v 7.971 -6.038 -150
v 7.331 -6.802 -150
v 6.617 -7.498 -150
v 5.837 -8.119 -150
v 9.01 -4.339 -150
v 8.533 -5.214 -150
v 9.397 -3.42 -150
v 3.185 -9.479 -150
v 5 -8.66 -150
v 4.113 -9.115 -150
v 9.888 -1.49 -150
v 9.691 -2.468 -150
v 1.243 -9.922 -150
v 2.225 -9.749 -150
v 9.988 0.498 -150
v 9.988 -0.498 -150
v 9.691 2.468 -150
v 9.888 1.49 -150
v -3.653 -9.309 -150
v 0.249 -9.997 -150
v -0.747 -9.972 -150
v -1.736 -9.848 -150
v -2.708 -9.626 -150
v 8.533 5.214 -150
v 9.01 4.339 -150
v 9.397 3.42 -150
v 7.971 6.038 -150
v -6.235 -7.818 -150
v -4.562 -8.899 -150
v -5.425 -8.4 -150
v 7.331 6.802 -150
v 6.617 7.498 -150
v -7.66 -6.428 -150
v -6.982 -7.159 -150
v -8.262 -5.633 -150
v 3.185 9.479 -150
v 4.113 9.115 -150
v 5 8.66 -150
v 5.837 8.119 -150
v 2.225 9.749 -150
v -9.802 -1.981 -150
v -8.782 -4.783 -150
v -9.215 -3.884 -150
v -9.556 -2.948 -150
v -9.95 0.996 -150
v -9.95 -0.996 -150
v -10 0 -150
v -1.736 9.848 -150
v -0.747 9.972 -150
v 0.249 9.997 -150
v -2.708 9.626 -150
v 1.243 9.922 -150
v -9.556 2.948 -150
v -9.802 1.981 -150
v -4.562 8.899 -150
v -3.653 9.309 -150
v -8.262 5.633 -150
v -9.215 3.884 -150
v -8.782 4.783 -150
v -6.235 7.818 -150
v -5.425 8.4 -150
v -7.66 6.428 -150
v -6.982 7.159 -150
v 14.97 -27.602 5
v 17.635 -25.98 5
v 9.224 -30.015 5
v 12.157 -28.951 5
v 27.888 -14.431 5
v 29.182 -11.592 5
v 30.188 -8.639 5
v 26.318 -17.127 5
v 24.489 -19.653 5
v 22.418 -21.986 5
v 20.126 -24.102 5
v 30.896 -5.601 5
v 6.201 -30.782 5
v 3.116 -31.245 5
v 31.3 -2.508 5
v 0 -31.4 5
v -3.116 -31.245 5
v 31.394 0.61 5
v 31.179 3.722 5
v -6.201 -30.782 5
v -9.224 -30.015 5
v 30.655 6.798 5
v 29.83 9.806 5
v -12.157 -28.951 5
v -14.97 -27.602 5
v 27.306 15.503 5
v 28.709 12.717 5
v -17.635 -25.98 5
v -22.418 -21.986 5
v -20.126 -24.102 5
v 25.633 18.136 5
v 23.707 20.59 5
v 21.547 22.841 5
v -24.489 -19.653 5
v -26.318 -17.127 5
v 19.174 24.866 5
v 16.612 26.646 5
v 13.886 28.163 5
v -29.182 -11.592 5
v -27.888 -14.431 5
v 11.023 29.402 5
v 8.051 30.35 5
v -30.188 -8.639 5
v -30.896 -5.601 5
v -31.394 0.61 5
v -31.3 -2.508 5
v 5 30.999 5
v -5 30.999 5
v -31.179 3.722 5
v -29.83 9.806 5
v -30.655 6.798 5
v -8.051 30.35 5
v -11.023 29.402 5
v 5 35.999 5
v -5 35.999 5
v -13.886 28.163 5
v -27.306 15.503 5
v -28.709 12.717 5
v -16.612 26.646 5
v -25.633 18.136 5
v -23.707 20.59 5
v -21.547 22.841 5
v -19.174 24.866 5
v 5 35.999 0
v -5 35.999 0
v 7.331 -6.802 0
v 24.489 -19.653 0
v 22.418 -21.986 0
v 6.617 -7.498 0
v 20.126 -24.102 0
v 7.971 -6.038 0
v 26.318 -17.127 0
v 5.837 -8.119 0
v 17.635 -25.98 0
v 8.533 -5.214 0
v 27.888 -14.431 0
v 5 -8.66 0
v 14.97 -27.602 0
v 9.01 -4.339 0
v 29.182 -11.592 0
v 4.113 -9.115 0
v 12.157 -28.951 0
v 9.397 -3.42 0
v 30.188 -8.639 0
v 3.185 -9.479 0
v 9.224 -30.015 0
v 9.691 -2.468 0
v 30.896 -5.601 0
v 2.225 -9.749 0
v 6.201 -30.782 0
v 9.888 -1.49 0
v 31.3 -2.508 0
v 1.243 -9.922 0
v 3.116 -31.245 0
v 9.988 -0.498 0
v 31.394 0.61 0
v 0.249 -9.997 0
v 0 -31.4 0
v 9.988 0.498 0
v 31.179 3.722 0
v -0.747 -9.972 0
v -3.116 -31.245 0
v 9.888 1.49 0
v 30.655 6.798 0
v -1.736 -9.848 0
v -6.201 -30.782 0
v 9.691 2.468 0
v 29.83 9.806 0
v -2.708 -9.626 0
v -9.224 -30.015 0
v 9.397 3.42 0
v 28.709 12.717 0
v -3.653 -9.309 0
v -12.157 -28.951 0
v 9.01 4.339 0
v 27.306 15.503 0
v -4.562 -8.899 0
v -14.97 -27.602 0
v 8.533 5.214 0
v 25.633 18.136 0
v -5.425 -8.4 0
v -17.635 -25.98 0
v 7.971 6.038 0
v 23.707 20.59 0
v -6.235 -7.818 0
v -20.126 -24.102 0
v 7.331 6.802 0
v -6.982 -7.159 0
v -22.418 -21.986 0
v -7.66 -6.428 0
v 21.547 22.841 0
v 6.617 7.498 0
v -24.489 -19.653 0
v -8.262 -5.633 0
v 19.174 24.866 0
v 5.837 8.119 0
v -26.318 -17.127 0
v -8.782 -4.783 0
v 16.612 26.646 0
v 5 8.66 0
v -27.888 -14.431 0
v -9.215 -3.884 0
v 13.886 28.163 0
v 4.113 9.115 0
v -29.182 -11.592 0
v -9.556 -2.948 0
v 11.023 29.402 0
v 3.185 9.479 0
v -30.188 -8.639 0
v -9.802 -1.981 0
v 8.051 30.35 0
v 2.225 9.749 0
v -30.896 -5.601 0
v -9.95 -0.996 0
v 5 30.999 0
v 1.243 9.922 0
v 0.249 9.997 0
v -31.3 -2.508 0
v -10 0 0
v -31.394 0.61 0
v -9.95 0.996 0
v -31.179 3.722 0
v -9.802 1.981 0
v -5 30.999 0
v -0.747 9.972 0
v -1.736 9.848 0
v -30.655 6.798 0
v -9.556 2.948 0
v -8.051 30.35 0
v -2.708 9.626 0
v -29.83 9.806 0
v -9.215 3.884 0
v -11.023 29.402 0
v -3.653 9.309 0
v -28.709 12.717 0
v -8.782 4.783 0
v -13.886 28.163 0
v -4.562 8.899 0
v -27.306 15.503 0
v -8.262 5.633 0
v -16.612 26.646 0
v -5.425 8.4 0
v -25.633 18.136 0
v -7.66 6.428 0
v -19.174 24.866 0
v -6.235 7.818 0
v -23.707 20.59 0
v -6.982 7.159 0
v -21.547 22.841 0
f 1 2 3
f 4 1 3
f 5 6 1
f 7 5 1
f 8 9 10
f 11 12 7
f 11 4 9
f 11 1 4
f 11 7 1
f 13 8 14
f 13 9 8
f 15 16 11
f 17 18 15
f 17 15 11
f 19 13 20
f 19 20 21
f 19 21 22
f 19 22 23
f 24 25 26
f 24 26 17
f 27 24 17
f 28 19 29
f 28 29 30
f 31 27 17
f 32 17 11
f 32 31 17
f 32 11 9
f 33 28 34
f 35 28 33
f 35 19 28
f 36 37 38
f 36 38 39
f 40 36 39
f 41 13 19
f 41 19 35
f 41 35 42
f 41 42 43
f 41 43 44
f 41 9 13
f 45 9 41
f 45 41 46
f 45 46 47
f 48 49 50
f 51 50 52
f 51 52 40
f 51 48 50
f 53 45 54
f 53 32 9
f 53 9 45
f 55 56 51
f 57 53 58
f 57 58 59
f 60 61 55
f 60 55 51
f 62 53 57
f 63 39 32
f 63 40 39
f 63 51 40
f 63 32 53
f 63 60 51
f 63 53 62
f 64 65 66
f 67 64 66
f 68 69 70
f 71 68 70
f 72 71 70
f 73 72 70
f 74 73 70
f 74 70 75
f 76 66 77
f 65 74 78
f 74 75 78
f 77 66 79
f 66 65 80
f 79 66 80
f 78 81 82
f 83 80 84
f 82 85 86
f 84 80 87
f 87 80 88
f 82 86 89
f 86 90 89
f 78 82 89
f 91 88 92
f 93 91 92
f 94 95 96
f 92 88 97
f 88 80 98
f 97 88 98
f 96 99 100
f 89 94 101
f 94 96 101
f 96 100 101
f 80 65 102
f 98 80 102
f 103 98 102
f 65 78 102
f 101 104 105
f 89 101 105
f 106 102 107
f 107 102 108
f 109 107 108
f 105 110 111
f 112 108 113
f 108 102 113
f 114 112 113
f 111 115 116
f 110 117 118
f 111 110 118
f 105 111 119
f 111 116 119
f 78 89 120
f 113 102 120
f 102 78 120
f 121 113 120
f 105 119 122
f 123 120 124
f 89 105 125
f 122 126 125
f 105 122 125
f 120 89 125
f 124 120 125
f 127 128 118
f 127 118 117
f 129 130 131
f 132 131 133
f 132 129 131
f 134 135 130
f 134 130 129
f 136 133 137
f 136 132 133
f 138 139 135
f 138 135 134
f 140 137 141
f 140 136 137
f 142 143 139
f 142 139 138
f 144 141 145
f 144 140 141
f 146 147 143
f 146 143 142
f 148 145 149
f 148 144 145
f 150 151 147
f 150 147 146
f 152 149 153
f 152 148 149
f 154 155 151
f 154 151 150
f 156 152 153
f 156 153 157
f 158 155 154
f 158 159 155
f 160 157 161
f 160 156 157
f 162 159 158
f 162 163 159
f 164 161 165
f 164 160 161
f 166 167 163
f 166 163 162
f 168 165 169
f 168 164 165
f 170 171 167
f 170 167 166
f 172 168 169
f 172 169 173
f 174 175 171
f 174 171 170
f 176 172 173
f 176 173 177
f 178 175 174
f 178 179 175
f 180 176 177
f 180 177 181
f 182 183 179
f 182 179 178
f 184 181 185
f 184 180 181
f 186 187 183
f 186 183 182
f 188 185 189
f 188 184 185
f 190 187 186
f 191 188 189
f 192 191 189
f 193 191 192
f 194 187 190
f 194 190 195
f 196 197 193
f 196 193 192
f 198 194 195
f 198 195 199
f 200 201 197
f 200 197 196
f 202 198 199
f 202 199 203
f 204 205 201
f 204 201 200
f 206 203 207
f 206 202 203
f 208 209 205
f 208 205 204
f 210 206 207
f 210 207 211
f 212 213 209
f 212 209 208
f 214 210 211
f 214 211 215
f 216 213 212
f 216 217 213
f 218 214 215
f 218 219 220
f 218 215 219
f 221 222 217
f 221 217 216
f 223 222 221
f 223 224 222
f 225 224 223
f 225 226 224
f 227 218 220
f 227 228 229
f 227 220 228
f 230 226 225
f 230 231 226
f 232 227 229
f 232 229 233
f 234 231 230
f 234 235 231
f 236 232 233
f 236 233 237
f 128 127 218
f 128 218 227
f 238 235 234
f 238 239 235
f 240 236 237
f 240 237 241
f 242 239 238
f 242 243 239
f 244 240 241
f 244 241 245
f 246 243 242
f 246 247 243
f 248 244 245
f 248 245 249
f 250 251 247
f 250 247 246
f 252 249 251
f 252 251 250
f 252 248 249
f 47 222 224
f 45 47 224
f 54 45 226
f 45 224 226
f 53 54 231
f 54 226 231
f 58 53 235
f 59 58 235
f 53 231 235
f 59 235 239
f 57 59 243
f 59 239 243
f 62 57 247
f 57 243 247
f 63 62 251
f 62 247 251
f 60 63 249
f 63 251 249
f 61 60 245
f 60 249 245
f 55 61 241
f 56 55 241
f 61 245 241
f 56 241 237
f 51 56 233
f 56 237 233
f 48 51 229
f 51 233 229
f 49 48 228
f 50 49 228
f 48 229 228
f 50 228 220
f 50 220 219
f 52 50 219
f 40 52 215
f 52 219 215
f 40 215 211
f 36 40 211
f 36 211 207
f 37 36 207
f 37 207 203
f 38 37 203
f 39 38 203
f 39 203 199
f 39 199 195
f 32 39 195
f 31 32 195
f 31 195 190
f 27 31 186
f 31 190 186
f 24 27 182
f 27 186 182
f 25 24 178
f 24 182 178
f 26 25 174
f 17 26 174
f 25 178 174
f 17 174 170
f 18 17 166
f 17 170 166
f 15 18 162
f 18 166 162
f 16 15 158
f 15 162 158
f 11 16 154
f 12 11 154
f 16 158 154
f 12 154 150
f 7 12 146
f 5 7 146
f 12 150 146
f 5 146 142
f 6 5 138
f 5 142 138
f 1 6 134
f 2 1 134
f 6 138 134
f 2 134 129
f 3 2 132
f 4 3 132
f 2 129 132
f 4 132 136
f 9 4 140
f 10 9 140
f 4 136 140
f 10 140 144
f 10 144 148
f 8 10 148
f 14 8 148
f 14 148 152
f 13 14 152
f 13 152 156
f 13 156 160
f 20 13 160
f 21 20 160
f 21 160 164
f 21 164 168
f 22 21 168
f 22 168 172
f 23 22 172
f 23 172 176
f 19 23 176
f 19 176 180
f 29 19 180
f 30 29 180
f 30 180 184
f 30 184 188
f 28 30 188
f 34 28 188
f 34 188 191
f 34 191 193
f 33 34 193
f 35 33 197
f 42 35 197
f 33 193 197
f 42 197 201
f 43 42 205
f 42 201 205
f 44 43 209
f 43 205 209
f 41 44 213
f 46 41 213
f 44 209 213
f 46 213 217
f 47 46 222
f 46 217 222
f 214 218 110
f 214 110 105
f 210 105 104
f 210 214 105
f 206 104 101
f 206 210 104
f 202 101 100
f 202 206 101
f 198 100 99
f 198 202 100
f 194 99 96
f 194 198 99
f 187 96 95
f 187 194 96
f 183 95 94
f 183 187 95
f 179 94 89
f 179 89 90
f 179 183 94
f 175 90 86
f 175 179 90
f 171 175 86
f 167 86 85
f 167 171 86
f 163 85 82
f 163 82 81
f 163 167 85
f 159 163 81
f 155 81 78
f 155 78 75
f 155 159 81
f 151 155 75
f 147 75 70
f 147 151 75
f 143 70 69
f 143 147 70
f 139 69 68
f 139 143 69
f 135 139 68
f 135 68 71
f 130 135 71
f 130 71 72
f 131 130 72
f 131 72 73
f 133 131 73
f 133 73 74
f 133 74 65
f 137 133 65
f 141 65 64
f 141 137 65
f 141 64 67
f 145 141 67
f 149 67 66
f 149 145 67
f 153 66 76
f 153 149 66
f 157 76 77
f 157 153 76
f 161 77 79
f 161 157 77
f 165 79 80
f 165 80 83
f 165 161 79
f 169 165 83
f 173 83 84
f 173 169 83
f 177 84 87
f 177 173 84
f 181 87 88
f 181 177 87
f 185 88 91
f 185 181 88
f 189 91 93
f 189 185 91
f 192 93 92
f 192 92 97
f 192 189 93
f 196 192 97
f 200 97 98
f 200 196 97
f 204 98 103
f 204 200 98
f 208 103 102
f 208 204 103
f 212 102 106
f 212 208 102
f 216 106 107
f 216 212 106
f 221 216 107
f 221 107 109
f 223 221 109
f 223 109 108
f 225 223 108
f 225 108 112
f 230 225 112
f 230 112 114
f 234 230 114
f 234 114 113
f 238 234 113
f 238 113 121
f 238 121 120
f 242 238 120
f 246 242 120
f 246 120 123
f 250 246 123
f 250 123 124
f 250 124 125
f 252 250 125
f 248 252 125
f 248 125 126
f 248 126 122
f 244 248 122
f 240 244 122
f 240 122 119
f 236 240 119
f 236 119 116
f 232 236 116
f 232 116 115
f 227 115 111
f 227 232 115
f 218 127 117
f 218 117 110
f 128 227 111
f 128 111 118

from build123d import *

# Parameters (mm, degrees)
BASE_EXTRUSION_DEPTH = 5
ESQUISSE2_R          = 10
BOSS_EXTRU_1_DEPTH   = 150


with BuildPart() as part:
    # Esquisse1 → Base-Extrusion (new body)
    with BuildSketch(Plane.XY):
        with BuildLine():
            Line((-5, 30.999354832), (-5, 35.999354832))
            Line((-5, 35.999354832), (5, 35.999354832))
            Line((5, 35.999354832), (5, 30.999354832))
            ThreePointArc((5, 30.999354832), (0, -31.4), (-5, 30.999354832))
        make_face()
    extrude(amount=BASE_EXTRUSION_DEPTH)

    # Esquisse2 → Boss.-Extru.1 (add)
    with BuildSketch(Plane(origin=(0, 0, 0), x_dir=(-1, 0, 0), z_dir=(0, 0, -1))):
        Circle(ESQUISSE2_R)
    extrude(amount=BOSS_EXTRU_1_DEPTH)


solid = part.part
